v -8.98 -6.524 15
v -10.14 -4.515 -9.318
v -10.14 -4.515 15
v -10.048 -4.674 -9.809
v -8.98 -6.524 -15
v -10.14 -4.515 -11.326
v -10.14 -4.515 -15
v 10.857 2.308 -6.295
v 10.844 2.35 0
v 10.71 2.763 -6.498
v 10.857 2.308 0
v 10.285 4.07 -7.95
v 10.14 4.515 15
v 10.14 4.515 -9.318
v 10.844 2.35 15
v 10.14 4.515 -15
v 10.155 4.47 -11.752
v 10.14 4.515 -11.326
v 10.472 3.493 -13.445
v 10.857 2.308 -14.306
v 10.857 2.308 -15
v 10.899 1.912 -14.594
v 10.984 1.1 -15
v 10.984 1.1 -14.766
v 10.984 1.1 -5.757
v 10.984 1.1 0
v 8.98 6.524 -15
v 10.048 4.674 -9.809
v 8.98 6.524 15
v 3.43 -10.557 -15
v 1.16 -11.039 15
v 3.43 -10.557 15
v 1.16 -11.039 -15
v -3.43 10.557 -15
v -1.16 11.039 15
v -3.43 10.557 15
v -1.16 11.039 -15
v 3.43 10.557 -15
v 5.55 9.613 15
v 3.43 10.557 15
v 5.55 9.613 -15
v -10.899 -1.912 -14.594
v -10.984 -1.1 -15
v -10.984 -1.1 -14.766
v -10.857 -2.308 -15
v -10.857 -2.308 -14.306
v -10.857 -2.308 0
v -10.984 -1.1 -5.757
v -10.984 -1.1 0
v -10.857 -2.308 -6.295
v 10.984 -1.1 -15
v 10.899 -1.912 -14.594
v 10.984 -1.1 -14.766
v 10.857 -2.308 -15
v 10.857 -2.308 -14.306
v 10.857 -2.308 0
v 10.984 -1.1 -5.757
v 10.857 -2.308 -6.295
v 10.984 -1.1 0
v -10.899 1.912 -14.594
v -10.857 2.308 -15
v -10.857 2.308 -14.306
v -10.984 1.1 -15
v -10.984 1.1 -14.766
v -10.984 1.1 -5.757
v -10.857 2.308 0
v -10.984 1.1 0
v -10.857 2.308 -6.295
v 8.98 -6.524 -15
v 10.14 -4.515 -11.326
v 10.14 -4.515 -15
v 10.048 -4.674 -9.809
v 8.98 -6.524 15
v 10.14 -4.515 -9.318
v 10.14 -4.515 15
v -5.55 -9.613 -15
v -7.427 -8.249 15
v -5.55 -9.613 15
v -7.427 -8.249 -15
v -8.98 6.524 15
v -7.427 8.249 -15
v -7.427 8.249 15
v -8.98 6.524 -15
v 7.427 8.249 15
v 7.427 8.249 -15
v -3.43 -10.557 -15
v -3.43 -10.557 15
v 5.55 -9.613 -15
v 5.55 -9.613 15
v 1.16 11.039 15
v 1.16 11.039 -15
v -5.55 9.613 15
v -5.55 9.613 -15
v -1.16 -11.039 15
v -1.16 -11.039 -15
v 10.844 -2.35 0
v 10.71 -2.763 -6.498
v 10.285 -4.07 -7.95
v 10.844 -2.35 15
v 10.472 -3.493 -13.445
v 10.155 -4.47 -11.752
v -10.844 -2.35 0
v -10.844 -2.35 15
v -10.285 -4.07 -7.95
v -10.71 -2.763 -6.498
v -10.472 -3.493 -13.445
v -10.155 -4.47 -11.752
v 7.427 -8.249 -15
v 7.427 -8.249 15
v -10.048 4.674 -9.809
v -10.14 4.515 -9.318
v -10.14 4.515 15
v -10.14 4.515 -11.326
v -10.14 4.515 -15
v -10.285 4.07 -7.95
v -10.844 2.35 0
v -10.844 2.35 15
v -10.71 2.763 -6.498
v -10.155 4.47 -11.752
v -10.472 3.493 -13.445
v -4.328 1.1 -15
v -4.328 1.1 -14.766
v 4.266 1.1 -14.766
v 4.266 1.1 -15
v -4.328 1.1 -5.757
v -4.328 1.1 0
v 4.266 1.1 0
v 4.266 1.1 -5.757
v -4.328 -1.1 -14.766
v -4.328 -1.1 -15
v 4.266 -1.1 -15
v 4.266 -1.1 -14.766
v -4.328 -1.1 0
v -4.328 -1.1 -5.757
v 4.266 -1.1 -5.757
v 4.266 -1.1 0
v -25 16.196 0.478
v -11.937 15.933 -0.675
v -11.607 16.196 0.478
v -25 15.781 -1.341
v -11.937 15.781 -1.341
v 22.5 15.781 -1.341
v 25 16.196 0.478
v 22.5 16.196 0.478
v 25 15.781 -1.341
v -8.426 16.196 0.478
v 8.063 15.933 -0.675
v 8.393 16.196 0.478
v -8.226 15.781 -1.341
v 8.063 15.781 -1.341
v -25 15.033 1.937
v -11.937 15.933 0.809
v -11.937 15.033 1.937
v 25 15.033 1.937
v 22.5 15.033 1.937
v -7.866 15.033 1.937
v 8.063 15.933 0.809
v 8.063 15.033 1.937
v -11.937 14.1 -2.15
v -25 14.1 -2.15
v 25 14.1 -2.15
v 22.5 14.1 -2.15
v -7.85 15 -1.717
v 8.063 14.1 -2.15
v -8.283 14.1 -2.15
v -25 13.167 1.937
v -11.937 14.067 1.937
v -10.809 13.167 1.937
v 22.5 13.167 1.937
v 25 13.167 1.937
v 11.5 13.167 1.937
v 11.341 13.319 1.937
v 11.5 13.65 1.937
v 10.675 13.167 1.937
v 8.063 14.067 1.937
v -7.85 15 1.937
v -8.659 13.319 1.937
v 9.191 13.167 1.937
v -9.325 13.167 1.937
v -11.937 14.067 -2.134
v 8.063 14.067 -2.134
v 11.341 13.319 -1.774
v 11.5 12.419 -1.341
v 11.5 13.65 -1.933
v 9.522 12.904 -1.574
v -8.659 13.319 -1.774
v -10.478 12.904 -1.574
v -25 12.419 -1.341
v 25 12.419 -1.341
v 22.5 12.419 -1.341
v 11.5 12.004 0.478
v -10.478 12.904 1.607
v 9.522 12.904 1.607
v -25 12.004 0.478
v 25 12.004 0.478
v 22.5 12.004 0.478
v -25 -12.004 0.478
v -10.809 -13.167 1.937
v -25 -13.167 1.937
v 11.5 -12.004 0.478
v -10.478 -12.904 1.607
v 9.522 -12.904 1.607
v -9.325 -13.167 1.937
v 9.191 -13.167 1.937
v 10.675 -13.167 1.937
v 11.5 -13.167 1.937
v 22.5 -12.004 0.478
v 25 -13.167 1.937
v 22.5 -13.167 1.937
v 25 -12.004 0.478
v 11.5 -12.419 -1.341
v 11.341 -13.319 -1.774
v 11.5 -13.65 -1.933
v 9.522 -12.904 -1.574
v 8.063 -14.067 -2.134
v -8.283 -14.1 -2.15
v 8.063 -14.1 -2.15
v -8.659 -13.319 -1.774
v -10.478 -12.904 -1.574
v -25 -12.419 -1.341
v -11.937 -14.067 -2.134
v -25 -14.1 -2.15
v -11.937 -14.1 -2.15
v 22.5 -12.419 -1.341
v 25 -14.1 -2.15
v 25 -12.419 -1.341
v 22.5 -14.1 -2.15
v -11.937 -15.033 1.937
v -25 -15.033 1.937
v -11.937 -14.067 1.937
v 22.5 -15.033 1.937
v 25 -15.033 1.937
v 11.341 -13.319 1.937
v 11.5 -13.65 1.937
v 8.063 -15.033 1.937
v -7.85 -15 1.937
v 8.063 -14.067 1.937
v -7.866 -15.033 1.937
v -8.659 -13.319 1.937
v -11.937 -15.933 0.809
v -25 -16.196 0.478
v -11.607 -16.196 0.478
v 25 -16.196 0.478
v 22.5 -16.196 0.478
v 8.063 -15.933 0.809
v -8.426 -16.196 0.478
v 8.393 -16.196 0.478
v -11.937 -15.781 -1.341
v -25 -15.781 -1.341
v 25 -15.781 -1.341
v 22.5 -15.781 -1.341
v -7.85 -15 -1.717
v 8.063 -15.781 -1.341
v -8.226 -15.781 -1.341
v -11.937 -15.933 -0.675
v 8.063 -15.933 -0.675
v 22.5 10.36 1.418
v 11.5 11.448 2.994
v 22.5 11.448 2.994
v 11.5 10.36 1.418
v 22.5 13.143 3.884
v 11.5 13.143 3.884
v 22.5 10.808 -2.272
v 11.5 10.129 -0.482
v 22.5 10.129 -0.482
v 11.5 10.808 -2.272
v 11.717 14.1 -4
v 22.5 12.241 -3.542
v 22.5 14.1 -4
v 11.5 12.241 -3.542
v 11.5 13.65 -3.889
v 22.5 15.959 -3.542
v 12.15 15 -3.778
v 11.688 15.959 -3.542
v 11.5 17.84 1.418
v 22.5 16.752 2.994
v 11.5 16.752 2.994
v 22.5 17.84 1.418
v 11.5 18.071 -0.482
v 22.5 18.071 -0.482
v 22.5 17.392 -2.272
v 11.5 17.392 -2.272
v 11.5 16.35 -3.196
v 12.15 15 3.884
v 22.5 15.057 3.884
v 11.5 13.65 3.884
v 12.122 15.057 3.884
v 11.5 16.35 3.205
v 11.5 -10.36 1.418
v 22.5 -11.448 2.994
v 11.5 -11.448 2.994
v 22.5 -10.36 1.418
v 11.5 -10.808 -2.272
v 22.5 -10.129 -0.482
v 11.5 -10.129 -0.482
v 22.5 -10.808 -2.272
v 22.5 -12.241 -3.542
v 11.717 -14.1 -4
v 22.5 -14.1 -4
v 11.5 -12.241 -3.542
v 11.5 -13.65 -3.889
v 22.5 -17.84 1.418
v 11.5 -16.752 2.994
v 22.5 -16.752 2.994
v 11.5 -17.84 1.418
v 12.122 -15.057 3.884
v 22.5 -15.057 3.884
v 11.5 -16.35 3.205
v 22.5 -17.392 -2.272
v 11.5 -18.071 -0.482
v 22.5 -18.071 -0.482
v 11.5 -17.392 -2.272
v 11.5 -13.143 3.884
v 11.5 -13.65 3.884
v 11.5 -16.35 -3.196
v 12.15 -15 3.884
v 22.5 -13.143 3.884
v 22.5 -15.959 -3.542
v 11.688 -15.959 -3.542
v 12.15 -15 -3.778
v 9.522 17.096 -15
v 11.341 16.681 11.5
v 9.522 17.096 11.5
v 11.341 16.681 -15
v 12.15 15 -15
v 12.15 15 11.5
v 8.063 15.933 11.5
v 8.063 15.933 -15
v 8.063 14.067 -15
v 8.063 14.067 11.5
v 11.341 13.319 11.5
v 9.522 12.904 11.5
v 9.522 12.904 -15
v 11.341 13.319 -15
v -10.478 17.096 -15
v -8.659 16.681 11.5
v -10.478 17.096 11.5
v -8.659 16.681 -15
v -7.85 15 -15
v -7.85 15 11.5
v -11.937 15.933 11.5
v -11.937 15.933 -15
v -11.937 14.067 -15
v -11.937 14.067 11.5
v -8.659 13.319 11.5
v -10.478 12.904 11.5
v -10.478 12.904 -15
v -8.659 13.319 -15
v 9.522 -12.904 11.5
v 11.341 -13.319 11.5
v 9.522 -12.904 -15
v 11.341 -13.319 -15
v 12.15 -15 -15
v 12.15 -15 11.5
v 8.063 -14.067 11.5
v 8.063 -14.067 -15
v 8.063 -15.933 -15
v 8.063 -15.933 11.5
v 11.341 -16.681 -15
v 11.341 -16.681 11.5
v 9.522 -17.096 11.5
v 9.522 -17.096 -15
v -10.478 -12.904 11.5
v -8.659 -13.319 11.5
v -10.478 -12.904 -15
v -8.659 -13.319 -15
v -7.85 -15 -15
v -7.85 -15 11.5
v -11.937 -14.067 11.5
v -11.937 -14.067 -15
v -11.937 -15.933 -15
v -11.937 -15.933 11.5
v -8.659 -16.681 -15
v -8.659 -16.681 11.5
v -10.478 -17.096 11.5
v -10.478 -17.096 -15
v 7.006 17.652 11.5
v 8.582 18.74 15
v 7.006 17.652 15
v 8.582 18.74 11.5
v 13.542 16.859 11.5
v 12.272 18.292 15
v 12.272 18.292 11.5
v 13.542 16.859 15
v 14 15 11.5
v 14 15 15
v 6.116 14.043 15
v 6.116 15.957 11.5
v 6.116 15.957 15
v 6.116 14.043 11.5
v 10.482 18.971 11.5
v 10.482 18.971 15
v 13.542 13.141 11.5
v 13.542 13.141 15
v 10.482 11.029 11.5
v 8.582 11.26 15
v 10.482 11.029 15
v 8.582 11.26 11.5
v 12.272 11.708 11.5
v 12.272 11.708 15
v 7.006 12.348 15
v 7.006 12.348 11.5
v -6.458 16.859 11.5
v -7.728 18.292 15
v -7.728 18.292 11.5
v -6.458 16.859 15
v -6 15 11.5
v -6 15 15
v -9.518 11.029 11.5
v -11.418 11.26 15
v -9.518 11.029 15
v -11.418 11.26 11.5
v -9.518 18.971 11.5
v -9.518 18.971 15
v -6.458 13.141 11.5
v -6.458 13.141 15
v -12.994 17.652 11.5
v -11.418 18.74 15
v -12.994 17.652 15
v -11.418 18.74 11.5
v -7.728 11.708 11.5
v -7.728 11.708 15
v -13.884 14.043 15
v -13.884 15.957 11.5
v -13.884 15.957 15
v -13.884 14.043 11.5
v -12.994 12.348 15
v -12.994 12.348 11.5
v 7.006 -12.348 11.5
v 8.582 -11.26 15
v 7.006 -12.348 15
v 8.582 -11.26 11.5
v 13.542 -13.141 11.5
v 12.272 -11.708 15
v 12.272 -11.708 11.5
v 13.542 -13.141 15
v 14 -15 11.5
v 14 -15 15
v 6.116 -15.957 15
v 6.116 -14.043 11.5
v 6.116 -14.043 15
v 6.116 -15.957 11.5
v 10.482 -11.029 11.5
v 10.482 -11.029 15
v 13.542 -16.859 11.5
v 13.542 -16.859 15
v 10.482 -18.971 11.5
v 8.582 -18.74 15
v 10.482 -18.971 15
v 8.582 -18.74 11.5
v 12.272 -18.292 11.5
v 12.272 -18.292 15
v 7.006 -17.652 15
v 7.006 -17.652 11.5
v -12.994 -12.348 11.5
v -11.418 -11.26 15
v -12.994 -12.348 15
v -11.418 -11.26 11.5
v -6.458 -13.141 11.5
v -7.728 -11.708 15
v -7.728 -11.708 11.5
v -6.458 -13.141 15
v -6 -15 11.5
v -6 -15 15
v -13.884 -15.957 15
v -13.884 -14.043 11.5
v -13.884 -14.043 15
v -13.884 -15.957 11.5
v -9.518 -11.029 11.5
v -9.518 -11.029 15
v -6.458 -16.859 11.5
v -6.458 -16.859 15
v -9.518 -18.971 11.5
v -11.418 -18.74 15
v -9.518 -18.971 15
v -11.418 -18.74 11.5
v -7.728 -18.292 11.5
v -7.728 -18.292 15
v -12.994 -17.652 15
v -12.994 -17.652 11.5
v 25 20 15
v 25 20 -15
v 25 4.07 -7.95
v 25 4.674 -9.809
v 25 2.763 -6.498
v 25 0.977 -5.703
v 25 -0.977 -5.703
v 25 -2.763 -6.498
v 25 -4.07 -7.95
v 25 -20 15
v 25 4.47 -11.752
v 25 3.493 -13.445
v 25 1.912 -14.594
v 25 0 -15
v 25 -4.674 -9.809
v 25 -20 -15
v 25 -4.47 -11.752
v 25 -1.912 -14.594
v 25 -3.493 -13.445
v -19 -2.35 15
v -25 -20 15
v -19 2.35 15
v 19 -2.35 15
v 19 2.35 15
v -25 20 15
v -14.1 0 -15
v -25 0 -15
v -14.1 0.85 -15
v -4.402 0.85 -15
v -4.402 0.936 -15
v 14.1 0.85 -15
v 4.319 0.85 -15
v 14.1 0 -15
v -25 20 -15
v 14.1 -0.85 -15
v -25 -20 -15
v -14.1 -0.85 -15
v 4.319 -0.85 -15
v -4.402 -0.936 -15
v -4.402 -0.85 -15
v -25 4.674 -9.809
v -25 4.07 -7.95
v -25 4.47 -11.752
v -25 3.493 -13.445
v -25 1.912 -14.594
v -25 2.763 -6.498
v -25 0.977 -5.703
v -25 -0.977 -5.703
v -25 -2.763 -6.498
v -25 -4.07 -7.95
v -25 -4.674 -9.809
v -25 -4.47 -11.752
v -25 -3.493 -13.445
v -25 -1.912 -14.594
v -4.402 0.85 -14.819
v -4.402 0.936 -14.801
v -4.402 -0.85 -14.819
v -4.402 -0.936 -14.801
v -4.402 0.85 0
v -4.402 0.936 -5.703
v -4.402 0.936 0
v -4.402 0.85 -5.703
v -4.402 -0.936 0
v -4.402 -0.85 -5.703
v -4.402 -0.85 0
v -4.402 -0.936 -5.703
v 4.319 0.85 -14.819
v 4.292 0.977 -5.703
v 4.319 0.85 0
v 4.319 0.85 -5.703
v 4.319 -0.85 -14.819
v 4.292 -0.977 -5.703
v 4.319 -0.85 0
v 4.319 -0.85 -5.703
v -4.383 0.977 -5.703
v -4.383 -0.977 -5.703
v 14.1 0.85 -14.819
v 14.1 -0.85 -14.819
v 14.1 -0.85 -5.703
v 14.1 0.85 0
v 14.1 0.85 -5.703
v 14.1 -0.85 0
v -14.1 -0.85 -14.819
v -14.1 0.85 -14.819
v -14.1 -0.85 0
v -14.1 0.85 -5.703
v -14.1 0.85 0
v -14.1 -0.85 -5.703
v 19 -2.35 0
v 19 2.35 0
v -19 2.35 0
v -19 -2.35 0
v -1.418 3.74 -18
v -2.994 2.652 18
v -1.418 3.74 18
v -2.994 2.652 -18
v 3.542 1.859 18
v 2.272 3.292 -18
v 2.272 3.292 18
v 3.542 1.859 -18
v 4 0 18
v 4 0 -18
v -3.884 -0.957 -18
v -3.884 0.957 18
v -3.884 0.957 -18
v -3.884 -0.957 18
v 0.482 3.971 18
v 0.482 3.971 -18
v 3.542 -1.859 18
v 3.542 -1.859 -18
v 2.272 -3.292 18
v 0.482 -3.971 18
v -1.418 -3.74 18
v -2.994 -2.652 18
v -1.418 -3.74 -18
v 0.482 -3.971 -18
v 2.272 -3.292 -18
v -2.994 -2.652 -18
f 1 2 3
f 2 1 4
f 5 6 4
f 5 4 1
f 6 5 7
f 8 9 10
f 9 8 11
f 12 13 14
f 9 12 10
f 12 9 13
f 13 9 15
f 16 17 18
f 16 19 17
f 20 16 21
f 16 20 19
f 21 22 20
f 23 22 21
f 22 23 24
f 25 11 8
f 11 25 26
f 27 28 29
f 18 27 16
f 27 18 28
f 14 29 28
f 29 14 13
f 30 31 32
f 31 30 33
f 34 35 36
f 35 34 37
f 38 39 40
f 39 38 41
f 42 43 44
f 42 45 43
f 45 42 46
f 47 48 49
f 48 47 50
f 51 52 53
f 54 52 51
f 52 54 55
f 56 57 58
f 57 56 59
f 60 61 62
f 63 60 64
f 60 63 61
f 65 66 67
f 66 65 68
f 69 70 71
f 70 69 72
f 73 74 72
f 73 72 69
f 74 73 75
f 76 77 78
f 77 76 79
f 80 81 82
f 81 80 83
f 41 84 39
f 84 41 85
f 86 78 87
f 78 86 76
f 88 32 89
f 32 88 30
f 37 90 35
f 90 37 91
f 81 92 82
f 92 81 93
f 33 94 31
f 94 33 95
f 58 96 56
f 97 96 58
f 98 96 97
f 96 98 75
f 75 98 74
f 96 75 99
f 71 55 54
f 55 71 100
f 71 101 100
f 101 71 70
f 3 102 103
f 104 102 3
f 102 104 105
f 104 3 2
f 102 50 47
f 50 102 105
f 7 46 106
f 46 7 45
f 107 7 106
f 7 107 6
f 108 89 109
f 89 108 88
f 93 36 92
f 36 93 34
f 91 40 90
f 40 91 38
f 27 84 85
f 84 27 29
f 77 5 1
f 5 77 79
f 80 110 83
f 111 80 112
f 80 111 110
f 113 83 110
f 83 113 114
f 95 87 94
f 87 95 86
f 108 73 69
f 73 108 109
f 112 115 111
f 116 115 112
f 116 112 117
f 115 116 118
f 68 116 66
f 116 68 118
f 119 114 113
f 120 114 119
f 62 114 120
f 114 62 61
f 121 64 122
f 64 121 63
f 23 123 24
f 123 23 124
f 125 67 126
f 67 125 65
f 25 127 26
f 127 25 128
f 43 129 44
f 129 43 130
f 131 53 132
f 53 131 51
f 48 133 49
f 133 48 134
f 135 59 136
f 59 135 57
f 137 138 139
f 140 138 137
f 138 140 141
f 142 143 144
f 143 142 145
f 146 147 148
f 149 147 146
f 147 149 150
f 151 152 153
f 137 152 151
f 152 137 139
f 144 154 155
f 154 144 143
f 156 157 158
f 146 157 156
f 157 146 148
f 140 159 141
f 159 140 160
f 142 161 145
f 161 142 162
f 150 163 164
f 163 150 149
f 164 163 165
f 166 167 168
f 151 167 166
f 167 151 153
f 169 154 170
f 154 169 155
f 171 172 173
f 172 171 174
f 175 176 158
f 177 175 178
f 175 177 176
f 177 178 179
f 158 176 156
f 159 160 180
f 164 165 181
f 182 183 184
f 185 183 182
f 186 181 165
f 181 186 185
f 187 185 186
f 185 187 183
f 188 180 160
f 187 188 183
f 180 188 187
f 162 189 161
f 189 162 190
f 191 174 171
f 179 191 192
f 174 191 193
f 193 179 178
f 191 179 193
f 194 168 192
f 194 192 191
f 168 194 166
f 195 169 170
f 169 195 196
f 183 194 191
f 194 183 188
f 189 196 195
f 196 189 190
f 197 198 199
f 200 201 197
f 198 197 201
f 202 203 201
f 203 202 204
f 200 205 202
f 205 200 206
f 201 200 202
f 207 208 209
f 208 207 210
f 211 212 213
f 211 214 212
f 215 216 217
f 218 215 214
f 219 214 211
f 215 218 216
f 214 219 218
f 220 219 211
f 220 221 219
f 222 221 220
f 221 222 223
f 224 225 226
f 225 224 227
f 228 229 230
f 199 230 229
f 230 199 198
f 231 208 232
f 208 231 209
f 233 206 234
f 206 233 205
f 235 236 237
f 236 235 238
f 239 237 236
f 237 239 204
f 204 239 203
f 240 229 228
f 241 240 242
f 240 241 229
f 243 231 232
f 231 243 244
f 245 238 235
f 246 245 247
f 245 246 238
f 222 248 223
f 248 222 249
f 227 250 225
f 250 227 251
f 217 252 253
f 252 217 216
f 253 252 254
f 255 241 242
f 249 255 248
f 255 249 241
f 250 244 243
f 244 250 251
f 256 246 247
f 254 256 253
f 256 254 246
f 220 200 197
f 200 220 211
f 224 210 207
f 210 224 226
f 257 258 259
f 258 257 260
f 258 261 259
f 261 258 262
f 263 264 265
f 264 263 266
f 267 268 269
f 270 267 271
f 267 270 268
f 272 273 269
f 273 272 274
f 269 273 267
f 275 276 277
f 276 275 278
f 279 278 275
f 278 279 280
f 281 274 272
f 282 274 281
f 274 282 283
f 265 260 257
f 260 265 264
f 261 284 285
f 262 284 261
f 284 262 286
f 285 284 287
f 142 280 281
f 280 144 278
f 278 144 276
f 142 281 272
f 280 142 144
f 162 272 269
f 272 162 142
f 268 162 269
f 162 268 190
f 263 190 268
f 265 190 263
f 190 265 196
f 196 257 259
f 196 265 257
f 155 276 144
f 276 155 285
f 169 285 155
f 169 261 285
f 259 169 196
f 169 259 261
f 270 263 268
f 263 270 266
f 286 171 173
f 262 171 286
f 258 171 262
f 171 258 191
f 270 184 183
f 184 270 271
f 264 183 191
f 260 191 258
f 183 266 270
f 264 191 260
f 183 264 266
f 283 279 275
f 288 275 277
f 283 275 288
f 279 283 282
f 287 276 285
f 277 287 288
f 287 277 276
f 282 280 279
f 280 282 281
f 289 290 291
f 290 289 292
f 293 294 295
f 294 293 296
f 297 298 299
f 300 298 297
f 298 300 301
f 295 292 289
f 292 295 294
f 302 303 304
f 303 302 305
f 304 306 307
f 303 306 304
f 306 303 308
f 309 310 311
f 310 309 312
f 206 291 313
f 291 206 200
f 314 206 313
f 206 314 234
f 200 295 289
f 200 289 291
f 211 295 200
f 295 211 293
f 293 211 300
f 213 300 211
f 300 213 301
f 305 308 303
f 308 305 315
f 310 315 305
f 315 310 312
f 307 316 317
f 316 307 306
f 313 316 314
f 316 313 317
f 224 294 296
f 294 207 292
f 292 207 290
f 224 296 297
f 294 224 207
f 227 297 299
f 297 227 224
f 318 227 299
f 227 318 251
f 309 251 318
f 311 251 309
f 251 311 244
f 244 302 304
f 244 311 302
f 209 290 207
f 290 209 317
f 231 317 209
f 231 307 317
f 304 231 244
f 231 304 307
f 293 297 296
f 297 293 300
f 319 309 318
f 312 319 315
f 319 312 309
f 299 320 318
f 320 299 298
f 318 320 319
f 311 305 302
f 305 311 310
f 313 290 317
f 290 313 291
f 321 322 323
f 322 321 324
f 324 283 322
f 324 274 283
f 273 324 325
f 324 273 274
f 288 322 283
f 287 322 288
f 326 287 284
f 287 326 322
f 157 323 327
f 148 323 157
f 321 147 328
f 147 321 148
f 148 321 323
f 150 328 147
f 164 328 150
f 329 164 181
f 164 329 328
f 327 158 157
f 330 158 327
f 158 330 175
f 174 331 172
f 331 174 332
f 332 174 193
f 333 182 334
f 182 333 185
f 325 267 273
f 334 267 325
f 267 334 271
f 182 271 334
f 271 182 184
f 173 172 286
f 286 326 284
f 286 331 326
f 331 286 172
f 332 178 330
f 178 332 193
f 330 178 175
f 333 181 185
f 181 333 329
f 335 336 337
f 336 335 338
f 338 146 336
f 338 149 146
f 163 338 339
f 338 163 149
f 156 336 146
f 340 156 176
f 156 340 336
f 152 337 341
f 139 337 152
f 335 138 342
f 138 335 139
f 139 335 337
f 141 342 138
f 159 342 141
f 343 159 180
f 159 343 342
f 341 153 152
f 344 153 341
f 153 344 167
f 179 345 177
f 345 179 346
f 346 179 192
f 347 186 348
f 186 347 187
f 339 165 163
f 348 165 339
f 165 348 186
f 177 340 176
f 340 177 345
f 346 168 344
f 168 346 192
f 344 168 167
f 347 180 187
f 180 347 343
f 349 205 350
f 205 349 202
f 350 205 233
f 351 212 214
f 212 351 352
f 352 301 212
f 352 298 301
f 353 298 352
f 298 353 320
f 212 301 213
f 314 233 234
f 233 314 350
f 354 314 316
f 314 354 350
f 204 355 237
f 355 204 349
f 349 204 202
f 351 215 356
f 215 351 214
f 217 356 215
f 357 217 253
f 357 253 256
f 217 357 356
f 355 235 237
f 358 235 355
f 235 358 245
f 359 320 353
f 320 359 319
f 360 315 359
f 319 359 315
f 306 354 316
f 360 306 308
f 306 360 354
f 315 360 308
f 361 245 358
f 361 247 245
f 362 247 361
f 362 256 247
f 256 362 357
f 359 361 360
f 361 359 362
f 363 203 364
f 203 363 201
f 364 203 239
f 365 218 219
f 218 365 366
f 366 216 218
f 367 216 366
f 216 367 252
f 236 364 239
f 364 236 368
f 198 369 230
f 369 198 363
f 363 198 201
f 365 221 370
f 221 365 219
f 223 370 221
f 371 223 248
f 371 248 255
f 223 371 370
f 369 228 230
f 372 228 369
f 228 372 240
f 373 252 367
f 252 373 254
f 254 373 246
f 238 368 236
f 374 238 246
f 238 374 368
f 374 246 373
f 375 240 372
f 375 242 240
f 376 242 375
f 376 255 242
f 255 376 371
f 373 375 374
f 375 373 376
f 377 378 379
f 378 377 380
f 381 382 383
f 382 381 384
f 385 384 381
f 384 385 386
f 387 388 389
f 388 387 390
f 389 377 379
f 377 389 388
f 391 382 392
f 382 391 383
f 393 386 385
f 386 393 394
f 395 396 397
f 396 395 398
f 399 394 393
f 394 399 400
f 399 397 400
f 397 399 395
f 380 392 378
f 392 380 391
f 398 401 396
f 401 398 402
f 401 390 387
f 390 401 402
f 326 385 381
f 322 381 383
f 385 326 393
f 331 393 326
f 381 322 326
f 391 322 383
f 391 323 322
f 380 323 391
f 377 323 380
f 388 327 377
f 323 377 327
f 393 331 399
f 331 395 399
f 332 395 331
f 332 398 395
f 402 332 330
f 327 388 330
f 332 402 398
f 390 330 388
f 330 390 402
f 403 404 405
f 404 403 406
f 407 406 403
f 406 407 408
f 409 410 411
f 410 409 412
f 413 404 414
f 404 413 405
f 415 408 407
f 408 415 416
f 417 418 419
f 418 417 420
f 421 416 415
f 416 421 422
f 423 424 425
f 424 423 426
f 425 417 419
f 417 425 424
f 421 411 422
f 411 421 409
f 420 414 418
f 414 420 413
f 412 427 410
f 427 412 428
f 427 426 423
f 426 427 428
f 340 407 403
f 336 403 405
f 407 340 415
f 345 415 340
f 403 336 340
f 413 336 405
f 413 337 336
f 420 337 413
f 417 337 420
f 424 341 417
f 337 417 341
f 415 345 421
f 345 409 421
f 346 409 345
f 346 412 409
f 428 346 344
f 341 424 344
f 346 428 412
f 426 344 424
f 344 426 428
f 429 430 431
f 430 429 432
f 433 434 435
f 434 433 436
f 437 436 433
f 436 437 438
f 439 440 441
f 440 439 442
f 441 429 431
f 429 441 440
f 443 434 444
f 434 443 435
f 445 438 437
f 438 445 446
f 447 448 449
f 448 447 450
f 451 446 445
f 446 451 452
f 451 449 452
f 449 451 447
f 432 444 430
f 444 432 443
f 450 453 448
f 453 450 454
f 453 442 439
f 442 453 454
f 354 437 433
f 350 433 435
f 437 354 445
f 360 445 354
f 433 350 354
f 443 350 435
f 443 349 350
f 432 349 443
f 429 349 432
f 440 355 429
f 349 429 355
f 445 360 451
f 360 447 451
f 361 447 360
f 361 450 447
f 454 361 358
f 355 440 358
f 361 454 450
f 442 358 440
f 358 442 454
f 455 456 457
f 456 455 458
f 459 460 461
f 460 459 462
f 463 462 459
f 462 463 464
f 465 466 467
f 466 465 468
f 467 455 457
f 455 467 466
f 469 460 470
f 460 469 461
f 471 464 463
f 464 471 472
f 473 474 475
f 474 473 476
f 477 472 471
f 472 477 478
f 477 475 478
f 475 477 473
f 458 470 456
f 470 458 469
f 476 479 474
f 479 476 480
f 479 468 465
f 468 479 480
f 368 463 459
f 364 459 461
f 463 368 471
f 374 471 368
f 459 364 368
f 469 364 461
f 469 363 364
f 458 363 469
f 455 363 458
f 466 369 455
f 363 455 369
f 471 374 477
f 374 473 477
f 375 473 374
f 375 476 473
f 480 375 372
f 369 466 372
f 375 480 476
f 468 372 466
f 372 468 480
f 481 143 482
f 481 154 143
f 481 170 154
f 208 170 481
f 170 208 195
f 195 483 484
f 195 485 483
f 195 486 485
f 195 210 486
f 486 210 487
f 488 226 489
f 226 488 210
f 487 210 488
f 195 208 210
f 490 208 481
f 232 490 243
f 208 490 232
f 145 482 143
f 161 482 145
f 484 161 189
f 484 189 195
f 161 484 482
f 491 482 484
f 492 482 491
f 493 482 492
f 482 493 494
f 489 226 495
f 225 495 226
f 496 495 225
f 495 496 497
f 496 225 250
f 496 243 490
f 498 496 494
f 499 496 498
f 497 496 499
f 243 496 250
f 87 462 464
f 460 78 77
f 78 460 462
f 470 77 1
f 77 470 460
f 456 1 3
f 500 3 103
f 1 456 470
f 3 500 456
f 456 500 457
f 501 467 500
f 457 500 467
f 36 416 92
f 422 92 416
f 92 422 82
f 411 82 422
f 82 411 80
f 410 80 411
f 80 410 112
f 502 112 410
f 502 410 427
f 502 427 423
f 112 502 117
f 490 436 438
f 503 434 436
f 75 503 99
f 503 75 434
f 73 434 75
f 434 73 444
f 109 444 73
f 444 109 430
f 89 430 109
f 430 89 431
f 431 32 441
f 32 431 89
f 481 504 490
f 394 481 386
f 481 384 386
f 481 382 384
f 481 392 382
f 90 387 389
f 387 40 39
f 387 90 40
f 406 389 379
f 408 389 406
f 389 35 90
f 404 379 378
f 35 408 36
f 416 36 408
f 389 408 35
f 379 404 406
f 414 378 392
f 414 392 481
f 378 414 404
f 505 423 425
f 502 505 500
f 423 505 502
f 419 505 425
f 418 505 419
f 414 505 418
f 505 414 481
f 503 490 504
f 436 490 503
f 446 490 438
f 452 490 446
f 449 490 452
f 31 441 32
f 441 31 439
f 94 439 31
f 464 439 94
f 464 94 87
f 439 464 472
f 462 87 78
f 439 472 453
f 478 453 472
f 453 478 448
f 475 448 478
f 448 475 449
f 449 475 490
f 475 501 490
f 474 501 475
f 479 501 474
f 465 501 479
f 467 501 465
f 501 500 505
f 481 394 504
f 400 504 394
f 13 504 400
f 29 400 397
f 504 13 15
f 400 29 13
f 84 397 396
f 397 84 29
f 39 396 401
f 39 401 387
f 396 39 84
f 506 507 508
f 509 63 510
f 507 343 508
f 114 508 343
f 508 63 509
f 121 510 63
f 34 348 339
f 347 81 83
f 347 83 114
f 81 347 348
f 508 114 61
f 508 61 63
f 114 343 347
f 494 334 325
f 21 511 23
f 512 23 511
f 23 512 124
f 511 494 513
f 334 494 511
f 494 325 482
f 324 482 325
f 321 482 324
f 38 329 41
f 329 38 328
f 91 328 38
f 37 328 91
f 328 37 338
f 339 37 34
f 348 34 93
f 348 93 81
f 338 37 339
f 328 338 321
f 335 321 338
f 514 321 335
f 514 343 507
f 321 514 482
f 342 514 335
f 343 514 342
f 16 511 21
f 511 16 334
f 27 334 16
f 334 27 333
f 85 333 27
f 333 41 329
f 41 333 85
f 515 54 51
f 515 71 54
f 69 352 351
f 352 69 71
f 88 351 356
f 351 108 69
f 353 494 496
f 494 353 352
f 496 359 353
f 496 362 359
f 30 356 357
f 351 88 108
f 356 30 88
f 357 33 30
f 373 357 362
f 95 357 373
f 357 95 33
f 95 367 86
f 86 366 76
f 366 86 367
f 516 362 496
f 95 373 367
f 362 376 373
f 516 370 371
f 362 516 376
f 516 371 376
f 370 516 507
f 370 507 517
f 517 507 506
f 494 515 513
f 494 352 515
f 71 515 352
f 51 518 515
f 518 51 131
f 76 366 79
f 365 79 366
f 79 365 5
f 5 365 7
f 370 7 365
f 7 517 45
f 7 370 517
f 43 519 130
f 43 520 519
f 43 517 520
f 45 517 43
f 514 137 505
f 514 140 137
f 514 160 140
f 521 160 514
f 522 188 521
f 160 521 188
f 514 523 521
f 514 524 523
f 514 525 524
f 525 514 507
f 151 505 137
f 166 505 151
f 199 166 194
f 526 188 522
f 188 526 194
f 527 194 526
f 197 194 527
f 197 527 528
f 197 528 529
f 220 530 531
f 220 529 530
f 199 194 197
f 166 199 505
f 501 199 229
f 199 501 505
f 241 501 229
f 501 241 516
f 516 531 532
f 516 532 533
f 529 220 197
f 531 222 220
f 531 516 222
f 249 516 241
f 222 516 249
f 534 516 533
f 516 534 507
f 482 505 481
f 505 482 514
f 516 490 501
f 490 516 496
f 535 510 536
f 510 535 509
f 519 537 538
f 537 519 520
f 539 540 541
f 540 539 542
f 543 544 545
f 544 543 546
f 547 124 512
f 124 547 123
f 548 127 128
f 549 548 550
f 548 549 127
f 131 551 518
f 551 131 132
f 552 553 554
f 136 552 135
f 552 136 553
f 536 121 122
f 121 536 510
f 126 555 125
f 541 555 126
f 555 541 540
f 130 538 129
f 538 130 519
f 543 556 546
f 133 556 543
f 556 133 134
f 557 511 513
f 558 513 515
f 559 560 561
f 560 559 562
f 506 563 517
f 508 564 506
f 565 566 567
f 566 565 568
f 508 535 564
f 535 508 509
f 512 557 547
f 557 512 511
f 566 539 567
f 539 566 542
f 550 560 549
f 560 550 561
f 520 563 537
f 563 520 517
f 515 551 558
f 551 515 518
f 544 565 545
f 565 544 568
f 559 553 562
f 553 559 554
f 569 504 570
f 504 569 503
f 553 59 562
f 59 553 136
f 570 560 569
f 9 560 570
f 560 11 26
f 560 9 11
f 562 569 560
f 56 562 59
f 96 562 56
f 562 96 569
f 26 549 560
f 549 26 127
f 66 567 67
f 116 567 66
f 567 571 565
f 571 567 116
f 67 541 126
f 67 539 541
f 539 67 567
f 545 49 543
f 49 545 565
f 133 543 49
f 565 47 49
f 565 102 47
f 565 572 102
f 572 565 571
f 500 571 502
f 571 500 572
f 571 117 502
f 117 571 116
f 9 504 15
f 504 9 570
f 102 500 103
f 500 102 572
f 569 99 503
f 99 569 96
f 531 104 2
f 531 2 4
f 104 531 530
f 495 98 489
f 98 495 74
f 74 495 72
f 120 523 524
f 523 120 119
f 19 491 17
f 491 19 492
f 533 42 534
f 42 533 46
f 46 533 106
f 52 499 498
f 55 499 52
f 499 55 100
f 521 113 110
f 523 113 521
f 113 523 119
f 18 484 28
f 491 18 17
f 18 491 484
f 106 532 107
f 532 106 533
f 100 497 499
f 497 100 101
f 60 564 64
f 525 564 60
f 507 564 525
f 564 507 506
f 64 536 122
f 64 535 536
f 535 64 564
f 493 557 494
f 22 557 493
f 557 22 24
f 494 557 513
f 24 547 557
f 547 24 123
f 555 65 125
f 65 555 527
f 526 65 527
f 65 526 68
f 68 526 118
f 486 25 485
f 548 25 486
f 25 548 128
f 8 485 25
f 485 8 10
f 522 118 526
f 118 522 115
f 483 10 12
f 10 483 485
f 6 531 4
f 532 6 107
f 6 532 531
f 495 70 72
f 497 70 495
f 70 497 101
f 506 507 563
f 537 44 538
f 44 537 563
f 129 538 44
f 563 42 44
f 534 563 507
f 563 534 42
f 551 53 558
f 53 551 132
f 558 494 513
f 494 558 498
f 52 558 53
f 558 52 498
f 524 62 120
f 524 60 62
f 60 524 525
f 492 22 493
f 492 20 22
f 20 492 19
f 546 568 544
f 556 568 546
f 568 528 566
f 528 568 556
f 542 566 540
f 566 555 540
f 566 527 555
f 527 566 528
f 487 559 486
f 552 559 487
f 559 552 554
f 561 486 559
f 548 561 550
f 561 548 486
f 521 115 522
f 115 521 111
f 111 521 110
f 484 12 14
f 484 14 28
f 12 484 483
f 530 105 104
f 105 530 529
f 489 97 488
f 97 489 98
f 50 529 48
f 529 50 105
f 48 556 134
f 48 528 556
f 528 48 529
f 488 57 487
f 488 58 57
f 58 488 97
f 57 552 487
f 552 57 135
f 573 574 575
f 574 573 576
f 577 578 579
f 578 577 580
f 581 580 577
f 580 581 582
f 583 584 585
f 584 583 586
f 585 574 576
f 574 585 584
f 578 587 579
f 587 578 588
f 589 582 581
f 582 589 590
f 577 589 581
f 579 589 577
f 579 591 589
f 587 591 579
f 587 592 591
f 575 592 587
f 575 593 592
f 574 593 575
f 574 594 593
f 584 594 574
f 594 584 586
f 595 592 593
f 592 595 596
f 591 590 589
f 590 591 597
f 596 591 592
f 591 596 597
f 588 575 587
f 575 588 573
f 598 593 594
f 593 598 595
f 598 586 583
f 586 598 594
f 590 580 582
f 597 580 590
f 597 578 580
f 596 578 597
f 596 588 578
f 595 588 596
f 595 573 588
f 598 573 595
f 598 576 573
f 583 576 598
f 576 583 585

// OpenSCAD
// Parameters
leadscrew_major_diameter_mm = 8; //[4:16:0.1]
leadscrew_clearance_diameter_mm = 9; //[6:18:0.1]
nut_outer_diameter_mm = 22; //[11:44:0.1]
nut_length_mm = 30; //[15:60:0.1]
housing_width_mm = 50; //[25:100:0.5]
housing_height_mm = 40; //[20:80:0.5]
housing_depth_mm = 30; //[15:60:0.5]
nut_pocket_diameter_mm = 22.2; //[11.1:44.4:0.1]
nut_pocket_depth_mm = 30.2; //[15.1:60.4:0.1]
anti_rotation_flat_width_mm = 20; //[10:40:0.1]
preload_travel_mm = 1.5; //[0.5:3:0.1]
preload_screw_count = 2; //[1:4:1]
preload_screw_clearance_diameter_mm = 4.3; //[3:6:0.1]
spring_pocket_diameter_mm = 8; //[4:16:0.1]
spring_pocket_depth_mm = 10; //[5:20:0.1]
rail_mount_hole_diameter_mm = 4.3; //[3:6:0.1]
rail_mount_hole_spacing_x_mm = 20; //[10:40:0.5]
rail_mount_hole_spacing_y_mm = 30; //[15:60:0.5]
mount_hole_edge_margin_mm = 6; //[3:12:0.5]
counterbore_diameter_mm = 8; //[6:14:0.1]
counterbore_depth_mm = 3; //[1:8:0.1]
material_clearance_mm = 0.2; //[0.05:0.6:0.05]
min_wall_thickness_mm = 3; //[1.5:6:0.1]
overlap_mm = 1; //[0.5:2:0.1]

// Base Shapes
module main_housing_block() {
  translate([0, 0, 0])
    cube([housing_width_mm, housing_height_mm, housing_depth_mm], center=true);
}

module t8_nut_pocket_cyl() {
  translate([0, 0, 0])
    cylinder(h=nut_pocket_depth_mm + 2*overlap_mm, r=nut_pocket_diameter_mm/2, center=true);
}

module anti_rotation_flat_cut() {
  translate([0, 0, 0])
    cube([nut_pocket_diameter_mm, nut_pocket_diameter_mm - anti_rotation_flat_width_mm, nut_pocket_depth_mm + 2*overlap_mm], center=true);
}

module leadscrew_clearance_bore() {
  translate([0, 0, 0])
    cylinder(h=housing_depth_mm + 2*overlap_mm, r=leadscrew_clearance_diameter_mm/2, center=true);
}

module split_slot_for_preload() {
  translate([0, 0, 0])
    cube([nut_pocket_diameter_mm + 2*min_wall_thickness_mm, preload_travel_mm + material_clearance_mm, housing_depth_mm + 2*overlap_mm], center=true);
}

module preload_screw_hole() {
  rotate([0, 90, 0])
    translate([0, 0, 0])
      cylinder(h=housing_width_mm + 2*overlap_mm, r=preload_screw_clearance_diameter_mm/2, center=true);
}

module spring_pocket() {
  rotate([0, 90, 0])
    translate([0, 0, 0])
      cylinder(h=spring_pocket_depth_mm + overlap_mm, r=spring_pocket_diameter_mm/2, center=true);
}

module rail_mount_through_hole() {
  translate([0, 0, 0])
    cylinder(h=housing_depth_mm + 2*overlap_mm, r=rail_mount_hole_diameter_mm/2, center=true);
}

module rail_mount_counterbore() {
  translate([0, 0, 0])
    cylinder(h=counterbore_depth_mm + overlap_mm, r=counterbore_diameter_mm/2, center=true);
}

module access_slot_for_adjustment() {
  translate([0, 0, 0])
    cube([housing_width_mm - 2*mount_hole_edge_margin_mm, preload_screw_clearance_diameter_mm + 2*material_clearance_mm, housing_depth_mm/2], center=true);
}

module debris_relief_channel() {
  rotate([0, 90, 0])
    translate([0, 0, 0])
      cylinder(h=housing_width_mm + 2*overlap_mm, r=leadscrew_clearance_diameter_mm/2 + material_clearance_mm, center=true);
}

module leadscrew_visual() {
  translate([0, 0, 0])
    cylinder(h=housing_depth_mm + 2*min_wall_thickness_mm, r=leadscrew_major_diameter_mm/2, center=true);
}

// Operations
module t8_nut_pocket() {
  difference() {
    t8_nut_pocket_cyl();
    anti_rotation_flat_cut();
  }
}

module preload_screws_pair() {
  union() {
    translate([0, nut_pocket_diameter_mm/2 + min_wall_thickness_mm, 0])
      preload_screw_hole();
    translate([0, -(nut_pocket_diameter_mm/2 + min_wall_thickness_mm), 0])
      preload_screw_hole();
  }
}

module spring_pockets_pair() {
  union() {
    translate([housing_width_mm/2 - spring_pocket_depth_mm/2 - min_wall_thickness_mm, nut_pocket_diameter_mm/2 + min_wall_thickness_mm, 0])
      spring_pocket();
    translate([housing_width_mm/2 - spring_pocket_depth_mm/2 - min_wall_thickness_mm, -(nut_pocket_diameter_mm/2 + min_wall_thickness_mm), 0])
      spring_pocket();
  }
}

module mounting_holes_pattern() {
  union() {
    translate([rail_mount_hole_spacing_x_mm/2, rail_mount_hole_spacing_y_mm/2, 0])
      rail_mount_through_hole();
    translate([-rail_mount_hole_spacing_x_mm/2, rail_mount_hole_spacing_y_mm/2, 0])
      rail_mount_through_hole();
    translate([rail_mount_hole_spacing_x_mm/2, -rail_mount_hole_spacing_y_mm/2, 0])
      rail_mount_through_hole();
    translate([-rail_mount_hole_spacing_x_mm/2, -rail_mount_hole_spacing_y_mm/2, 0])
      rail_mount_through_hole();
  }
}

module counterbores_or_countersinks() {
  union() {
    translate([rail_mount_hole_spacing_x_mm/2, rail_mount_hole_spacing_y_mm/2, housing_depth_mm/2 - counterbore_depth_mm/2])
      rail_mount_counterbore();
    translate([-rail_mount_hole_spacing_x_mm/2, rail_mount_hole_spacing_y_mm/2, housing_depth_mm/2 - counterbore_depth_mm/2])
      rail_mount_counterbore();
    translate([rail_mount_hole_spacing_x_mm/2, -rail_mount_hole_spacing_y_mm/2, housing_depth_mm/2 - counterbore_depth_mm/2])
      rail_mount_counterbore();
    translate([-rail_mount_hole_spacing_x_mm/2, -rail_mount_hole_spacing_y_mm/2, housing_depth_mm/2 - counterbore_depth_mm/2])
      rail_mount_counterbore();
  }
}

module access_slot_pos() {
  translate([0, 0, housing_depth_mm/2 - (housing_depth_mm/2)/2])
    access_slot_for_adjustment();
}

module debris_relief_pos() {
  translate([0, 0, -housing_depth_mm/2 + (leadscrew_clearance_diameter_mm/2 + material_clearance_mm)])
    debris_relief_channel();
}

module linear_rail_mount_interface() {
  difference() {
    main_housing_block();
    t8_nut_pocket();
    leadscrew_clearance_bore();
    split_slot_for_preload();
    preload_screws_pair();
    spring_pockets_pair();
    mounting_holes_pattern();
    counterbores_or_countersinks();
    access_slot_pos();
    debris_relief_pos();
  }
}

// Final Model
union() {
  linear_rail_mount_interface();
  leadscrew_visual();
}
